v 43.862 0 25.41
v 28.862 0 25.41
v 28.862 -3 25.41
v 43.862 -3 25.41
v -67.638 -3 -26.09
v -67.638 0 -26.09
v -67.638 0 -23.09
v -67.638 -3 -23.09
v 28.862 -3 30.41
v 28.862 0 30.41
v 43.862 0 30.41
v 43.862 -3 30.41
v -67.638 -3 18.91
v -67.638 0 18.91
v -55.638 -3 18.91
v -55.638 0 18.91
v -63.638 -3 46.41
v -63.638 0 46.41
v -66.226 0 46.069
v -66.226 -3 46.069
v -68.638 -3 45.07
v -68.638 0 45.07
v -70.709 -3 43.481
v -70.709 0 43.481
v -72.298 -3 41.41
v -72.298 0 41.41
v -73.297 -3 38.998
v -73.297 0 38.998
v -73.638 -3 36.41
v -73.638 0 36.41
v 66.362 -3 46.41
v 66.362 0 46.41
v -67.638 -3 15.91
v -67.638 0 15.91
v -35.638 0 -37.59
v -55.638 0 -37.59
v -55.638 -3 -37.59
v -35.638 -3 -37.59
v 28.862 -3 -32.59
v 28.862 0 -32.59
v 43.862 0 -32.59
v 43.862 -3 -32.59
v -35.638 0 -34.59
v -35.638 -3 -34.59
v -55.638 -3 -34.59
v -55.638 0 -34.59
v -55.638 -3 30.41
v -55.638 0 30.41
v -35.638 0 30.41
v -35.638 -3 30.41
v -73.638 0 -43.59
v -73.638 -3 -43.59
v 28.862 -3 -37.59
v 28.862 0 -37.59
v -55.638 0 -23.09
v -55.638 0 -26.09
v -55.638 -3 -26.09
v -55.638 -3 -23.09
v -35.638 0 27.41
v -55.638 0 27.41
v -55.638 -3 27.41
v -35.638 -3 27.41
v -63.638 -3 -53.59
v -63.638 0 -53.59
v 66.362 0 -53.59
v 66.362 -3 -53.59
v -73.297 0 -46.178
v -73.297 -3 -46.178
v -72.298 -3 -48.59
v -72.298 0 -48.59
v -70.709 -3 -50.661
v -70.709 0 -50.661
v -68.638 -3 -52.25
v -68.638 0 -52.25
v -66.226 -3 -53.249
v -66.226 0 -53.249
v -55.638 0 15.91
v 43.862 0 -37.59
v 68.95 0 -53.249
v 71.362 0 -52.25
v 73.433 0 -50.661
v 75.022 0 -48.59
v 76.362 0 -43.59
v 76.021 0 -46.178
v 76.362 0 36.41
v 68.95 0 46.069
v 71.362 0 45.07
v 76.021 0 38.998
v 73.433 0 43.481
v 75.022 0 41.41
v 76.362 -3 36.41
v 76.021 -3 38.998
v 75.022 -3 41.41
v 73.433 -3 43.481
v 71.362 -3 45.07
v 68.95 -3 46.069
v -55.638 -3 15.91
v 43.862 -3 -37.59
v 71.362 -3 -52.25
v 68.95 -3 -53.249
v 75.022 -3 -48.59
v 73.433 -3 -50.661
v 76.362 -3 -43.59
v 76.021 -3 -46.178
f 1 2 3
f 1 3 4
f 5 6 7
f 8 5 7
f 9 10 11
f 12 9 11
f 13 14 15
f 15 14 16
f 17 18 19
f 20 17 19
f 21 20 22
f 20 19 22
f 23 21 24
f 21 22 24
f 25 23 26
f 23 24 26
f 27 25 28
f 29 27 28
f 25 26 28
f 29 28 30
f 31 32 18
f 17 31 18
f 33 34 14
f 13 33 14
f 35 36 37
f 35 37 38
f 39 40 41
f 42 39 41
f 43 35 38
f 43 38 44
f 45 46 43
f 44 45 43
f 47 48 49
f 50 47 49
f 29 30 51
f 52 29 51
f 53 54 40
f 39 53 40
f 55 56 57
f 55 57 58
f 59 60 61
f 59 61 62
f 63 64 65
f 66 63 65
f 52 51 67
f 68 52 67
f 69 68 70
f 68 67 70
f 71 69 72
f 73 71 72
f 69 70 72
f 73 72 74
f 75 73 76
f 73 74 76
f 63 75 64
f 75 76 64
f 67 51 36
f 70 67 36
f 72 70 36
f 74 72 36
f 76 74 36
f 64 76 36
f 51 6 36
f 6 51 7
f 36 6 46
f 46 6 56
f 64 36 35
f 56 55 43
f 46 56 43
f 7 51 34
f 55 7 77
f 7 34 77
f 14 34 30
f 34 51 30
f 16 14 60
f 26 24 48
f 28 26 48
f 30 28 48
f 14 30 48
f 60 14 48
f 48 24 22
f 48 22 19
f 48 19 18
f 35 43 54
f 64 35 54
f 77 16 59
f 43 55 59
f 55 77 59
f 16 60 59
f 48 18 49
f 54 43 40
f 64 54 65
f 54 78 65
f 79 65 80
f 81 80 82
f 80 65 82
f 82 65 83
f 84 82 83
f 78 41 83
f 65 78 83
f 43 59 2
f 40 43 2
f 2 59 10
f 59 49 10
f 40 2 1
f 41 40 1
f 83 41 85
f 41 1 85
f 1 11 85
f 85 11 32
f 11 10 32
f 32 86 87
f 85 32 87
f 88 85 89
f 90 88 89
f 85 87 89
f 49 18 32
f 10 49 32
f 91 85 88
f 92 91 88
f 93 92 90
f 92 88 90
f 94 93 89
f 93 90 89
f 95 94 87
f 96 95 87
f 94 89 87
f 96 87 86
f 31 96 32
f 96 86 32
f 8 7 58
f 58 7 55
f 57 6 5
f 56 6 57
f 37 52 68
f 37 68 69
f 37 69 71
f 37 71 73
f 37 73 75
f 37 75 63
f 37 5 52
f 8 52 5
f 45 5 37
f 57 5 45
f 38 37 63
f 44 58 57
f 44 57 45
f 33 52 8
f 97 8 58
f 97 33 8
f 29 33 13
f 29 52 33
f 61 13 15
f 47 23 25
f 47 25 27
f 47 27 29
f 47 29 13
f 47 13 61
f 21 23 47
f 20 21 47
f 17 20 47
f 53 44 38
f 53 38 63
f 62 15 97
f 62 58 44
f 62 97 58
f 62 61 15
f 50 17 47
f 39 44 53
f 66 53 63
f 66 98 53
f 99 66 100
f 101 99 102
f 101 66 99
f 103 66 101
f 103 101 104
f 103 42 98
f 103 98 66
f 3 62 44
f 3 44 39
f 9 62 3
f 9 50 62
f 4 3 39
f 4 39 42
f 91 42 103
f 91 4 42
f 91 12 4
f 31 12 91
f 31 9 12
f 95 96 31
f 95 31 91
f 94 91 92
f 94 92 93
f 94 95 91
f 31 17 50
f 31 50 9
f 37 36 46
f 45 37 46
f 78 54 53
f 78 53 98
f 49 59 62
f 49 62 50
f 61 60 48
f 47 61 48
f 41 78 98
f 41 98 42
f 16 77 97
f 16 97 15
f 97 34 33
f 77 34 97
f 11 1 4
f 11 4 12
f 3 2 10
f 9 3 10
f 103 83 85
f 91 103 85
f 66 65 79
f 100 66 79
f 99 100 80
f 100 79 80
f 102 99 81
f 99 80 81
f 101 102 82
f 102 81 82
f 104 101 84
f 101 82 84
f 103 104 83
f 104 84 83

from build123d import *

# Parameters (mm, degrees)
F0_W     = 20
F0_H     = 3
F0_W_2   = 12
F0_W_3   = 15
F0_H_2   = 5
F1_DEPTH = 3


with BuildPart() as f1:
    # F0 (on Front) → F1 (new body)
    with BuildSketch(Plane.XZ):
        with BuildLine():
            ThreePointArc((76.362, 36.409888), (73.433068, 43.480956), (66.362, 46.409888))
            Line((66.362, 46.409888), (-63.638, 46.409888))
            ThreePointArc((-63.638, 46.409888), (-70.709067, 43.480956), (-73.638, 36.409888))
            Line((-73.638, 36.409888), (-73.638, -43.590112))
            ThreePointArc((-73.638, -43.590112), (-70.709067, -50.66118), (-63.638, -53.590112))
            Line((-63.638, -53.590112), (66.362, -53.590112))
            ThreePointArc((66.362, -53.590112), (73.433068, -50.66118), (76.362, -43.590112))
            Line((76.362, -43.590112), (76.362, 36.409888))
        make_face()
        with Locations((-45.638, -36.090112)):
            Rectangle(F0_W, F0_H, mode=Mode.SUBTRACT)
        with Locations((-61.638, -24.590112)):
            Rectangle(F0_W_2, F0_H, mode=Mode.SUBTRACT)
        with Locations((36.362, -35.090112)):
            Rectangle(F0_W_3, F0_H_2, mode=Mode.SUBTRACT)
        with Locations((-61.638, 17.409888)):
            Rectangle(F0_W_2, F0_H, mode=Mode.SUBTRACT)
        with Locations((-45.638, 28.909888)):
            Rectangle(F0_W, F0_H, mode=Mode.SUBTRACT)
        with Locations((36.362, 27.909888)):
            Rectangle(F0_W_3, F0_H_2, mode=Mode.SUBTRACT)
    extrude(amount=F1_DEPTH)


solid = f1.part
